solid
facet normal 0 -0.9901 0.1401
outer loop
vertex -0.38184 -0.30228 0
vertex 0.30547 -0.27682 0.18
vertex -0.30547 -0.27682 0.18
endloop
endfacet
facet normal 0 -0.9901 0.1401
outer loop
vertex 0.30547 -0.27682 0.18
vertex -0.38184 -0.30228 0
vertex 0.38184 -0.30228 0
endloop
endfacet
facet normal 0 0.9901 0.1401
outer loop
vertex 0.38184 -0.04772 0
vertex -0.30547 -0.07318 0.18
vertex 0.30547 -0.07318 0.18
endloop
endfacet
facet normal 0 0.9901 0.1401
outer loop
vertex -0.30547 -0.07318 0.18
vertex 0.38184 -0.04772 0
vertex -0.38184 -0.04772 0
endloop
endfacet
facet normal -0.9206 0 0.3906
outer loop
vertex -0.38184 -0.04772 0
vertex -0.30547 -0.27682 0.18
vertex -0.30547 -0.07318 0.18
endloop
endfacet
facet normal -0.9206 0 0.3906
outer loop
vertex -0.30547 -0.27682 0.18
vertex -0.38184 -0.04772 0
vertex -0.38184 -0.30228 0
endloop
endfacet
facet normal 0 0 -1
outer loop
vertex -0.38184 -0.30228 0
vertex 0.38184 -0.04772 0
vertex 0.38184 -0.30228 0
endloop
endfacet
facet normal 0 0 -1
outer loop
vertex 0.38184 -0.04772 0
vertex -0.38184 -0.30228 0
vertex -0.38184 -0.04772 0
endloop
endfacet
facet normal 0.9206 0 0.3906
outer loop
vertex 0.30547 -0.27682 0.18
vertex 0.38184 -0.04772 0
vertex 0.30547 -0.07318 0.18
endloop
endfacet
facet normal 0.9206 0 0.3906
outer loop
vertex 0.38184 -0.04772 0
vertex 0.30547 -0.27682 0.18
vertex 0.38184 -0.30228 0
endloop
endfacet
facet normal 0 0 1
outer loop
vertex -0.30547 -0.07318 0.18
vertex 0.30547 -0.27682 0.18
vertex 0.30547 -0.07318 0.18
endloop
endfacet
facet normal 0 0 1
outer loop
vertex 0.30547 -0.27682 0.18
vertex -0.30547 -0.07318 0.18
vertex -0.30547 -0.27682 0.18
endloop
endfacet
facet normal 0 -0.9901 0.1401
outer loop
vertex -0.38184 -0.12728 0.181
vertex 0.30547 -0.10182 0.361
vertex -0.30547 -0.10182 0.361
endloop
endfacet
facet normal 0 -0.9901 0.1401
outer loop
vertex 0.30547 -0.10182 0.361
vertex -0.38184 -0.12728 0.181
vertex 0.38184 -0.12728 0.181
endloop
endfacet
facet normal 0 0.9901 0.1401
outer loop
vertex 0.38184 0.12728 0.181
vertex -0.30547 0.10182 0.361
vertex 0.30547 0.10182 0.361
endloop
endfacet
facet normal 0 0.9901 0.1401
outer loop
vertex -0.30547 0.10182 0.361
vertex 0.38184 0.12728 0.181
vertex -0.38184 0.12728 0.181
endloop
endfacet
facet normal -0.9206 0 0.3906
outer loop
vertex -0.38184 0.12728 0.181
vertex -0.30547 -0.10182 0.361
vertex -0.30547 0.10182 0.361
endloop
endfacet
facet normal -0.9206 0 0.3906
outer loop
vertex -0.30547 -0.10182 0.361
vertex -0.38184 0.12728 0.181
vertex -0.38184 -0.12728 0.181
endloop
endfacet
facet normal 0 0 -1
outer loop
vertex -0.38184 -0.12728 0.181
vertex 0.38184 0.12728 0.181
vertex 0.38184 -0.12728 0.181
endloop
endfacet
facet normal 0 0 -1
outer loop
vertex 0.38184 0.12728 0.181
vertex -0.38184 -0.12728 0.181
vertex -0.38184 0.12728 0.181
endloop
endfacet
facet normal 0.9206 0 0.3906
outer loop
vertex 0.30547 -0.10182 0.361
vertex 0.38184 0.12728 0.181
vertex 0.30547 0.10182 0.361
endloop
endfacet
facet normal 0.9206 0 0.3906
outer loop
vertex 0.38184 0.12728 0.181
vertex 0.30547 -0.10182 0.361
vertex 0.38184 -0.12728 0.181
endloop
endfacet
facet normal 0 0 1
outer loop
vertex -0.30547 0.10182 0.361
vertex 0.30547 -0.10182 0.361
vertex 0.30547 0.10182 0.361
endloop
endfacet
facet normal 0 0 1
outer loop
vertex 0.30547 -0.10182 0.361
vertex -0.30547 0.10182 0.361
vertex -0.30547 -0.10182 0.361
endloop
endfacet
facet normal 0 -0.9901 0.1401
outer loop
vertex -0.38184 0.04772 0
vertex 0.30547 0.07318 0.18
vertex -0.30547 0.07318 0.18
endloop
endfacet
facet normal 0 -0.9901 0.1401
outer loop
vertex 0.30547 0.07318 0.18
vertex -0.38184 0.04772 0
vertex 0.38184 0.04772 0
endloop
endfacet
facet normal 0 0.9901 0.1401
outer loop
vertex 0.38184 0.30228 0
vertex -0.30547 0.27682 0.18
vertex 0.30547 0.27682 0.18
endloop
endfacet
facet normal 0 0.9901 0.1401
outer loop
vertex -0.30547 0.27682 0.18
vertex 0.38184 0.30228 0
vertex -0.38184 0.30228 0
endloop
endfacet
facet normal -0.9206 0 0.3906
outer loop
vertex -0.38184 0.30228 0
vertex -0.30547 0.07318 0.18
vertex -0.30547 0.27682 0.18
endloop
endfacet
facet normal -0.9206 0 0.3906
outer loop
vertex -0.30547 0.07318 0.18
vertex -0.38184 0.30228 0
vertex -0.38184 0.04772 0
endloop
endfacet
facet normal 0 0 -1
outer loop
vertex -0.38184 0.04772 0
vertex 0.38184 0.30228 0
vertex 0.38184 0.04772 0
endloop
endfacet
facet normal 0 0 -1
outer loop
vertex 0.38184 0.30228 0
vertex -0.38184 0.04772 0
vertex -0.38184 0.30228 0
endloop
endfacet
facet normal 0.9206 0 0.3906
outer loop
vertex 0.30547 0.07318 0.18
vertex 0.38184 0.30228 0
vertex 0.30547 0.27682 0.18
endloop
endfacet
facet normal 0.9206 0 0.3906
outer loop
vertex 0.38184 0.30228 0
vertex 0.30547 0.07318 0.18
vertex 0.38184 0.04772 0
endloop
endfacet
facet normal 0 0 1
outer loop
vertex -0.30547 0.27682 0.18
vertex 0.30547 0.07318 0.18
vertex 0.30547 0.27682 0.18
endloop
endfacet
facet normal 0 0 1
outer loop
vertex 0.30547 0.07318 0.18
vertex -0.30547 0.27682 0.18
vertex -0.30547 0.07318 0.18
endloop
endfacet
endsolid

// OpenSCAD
use <lib.scad>

s=0.18;

module ingotHD() {
	minkowskiOutsideRound(0.01,$fn=6) scale([s,s,s]) scale([3,1,1]) rotate([0,0,45]) cyl(1, 0.8, 1, $fn=4);
}

module ingotLD() {
	scale([s,s,s]) scale([3,1,1]) rotate([0,0,45]) cyl(1, 0.8, 1, $fn=4);
}

translate([0,-0.175,0.09]) ingotLD();
translate([0,0,0.271]) ingotLD();
translate([0,0.175,0.09]) ingotLD();
